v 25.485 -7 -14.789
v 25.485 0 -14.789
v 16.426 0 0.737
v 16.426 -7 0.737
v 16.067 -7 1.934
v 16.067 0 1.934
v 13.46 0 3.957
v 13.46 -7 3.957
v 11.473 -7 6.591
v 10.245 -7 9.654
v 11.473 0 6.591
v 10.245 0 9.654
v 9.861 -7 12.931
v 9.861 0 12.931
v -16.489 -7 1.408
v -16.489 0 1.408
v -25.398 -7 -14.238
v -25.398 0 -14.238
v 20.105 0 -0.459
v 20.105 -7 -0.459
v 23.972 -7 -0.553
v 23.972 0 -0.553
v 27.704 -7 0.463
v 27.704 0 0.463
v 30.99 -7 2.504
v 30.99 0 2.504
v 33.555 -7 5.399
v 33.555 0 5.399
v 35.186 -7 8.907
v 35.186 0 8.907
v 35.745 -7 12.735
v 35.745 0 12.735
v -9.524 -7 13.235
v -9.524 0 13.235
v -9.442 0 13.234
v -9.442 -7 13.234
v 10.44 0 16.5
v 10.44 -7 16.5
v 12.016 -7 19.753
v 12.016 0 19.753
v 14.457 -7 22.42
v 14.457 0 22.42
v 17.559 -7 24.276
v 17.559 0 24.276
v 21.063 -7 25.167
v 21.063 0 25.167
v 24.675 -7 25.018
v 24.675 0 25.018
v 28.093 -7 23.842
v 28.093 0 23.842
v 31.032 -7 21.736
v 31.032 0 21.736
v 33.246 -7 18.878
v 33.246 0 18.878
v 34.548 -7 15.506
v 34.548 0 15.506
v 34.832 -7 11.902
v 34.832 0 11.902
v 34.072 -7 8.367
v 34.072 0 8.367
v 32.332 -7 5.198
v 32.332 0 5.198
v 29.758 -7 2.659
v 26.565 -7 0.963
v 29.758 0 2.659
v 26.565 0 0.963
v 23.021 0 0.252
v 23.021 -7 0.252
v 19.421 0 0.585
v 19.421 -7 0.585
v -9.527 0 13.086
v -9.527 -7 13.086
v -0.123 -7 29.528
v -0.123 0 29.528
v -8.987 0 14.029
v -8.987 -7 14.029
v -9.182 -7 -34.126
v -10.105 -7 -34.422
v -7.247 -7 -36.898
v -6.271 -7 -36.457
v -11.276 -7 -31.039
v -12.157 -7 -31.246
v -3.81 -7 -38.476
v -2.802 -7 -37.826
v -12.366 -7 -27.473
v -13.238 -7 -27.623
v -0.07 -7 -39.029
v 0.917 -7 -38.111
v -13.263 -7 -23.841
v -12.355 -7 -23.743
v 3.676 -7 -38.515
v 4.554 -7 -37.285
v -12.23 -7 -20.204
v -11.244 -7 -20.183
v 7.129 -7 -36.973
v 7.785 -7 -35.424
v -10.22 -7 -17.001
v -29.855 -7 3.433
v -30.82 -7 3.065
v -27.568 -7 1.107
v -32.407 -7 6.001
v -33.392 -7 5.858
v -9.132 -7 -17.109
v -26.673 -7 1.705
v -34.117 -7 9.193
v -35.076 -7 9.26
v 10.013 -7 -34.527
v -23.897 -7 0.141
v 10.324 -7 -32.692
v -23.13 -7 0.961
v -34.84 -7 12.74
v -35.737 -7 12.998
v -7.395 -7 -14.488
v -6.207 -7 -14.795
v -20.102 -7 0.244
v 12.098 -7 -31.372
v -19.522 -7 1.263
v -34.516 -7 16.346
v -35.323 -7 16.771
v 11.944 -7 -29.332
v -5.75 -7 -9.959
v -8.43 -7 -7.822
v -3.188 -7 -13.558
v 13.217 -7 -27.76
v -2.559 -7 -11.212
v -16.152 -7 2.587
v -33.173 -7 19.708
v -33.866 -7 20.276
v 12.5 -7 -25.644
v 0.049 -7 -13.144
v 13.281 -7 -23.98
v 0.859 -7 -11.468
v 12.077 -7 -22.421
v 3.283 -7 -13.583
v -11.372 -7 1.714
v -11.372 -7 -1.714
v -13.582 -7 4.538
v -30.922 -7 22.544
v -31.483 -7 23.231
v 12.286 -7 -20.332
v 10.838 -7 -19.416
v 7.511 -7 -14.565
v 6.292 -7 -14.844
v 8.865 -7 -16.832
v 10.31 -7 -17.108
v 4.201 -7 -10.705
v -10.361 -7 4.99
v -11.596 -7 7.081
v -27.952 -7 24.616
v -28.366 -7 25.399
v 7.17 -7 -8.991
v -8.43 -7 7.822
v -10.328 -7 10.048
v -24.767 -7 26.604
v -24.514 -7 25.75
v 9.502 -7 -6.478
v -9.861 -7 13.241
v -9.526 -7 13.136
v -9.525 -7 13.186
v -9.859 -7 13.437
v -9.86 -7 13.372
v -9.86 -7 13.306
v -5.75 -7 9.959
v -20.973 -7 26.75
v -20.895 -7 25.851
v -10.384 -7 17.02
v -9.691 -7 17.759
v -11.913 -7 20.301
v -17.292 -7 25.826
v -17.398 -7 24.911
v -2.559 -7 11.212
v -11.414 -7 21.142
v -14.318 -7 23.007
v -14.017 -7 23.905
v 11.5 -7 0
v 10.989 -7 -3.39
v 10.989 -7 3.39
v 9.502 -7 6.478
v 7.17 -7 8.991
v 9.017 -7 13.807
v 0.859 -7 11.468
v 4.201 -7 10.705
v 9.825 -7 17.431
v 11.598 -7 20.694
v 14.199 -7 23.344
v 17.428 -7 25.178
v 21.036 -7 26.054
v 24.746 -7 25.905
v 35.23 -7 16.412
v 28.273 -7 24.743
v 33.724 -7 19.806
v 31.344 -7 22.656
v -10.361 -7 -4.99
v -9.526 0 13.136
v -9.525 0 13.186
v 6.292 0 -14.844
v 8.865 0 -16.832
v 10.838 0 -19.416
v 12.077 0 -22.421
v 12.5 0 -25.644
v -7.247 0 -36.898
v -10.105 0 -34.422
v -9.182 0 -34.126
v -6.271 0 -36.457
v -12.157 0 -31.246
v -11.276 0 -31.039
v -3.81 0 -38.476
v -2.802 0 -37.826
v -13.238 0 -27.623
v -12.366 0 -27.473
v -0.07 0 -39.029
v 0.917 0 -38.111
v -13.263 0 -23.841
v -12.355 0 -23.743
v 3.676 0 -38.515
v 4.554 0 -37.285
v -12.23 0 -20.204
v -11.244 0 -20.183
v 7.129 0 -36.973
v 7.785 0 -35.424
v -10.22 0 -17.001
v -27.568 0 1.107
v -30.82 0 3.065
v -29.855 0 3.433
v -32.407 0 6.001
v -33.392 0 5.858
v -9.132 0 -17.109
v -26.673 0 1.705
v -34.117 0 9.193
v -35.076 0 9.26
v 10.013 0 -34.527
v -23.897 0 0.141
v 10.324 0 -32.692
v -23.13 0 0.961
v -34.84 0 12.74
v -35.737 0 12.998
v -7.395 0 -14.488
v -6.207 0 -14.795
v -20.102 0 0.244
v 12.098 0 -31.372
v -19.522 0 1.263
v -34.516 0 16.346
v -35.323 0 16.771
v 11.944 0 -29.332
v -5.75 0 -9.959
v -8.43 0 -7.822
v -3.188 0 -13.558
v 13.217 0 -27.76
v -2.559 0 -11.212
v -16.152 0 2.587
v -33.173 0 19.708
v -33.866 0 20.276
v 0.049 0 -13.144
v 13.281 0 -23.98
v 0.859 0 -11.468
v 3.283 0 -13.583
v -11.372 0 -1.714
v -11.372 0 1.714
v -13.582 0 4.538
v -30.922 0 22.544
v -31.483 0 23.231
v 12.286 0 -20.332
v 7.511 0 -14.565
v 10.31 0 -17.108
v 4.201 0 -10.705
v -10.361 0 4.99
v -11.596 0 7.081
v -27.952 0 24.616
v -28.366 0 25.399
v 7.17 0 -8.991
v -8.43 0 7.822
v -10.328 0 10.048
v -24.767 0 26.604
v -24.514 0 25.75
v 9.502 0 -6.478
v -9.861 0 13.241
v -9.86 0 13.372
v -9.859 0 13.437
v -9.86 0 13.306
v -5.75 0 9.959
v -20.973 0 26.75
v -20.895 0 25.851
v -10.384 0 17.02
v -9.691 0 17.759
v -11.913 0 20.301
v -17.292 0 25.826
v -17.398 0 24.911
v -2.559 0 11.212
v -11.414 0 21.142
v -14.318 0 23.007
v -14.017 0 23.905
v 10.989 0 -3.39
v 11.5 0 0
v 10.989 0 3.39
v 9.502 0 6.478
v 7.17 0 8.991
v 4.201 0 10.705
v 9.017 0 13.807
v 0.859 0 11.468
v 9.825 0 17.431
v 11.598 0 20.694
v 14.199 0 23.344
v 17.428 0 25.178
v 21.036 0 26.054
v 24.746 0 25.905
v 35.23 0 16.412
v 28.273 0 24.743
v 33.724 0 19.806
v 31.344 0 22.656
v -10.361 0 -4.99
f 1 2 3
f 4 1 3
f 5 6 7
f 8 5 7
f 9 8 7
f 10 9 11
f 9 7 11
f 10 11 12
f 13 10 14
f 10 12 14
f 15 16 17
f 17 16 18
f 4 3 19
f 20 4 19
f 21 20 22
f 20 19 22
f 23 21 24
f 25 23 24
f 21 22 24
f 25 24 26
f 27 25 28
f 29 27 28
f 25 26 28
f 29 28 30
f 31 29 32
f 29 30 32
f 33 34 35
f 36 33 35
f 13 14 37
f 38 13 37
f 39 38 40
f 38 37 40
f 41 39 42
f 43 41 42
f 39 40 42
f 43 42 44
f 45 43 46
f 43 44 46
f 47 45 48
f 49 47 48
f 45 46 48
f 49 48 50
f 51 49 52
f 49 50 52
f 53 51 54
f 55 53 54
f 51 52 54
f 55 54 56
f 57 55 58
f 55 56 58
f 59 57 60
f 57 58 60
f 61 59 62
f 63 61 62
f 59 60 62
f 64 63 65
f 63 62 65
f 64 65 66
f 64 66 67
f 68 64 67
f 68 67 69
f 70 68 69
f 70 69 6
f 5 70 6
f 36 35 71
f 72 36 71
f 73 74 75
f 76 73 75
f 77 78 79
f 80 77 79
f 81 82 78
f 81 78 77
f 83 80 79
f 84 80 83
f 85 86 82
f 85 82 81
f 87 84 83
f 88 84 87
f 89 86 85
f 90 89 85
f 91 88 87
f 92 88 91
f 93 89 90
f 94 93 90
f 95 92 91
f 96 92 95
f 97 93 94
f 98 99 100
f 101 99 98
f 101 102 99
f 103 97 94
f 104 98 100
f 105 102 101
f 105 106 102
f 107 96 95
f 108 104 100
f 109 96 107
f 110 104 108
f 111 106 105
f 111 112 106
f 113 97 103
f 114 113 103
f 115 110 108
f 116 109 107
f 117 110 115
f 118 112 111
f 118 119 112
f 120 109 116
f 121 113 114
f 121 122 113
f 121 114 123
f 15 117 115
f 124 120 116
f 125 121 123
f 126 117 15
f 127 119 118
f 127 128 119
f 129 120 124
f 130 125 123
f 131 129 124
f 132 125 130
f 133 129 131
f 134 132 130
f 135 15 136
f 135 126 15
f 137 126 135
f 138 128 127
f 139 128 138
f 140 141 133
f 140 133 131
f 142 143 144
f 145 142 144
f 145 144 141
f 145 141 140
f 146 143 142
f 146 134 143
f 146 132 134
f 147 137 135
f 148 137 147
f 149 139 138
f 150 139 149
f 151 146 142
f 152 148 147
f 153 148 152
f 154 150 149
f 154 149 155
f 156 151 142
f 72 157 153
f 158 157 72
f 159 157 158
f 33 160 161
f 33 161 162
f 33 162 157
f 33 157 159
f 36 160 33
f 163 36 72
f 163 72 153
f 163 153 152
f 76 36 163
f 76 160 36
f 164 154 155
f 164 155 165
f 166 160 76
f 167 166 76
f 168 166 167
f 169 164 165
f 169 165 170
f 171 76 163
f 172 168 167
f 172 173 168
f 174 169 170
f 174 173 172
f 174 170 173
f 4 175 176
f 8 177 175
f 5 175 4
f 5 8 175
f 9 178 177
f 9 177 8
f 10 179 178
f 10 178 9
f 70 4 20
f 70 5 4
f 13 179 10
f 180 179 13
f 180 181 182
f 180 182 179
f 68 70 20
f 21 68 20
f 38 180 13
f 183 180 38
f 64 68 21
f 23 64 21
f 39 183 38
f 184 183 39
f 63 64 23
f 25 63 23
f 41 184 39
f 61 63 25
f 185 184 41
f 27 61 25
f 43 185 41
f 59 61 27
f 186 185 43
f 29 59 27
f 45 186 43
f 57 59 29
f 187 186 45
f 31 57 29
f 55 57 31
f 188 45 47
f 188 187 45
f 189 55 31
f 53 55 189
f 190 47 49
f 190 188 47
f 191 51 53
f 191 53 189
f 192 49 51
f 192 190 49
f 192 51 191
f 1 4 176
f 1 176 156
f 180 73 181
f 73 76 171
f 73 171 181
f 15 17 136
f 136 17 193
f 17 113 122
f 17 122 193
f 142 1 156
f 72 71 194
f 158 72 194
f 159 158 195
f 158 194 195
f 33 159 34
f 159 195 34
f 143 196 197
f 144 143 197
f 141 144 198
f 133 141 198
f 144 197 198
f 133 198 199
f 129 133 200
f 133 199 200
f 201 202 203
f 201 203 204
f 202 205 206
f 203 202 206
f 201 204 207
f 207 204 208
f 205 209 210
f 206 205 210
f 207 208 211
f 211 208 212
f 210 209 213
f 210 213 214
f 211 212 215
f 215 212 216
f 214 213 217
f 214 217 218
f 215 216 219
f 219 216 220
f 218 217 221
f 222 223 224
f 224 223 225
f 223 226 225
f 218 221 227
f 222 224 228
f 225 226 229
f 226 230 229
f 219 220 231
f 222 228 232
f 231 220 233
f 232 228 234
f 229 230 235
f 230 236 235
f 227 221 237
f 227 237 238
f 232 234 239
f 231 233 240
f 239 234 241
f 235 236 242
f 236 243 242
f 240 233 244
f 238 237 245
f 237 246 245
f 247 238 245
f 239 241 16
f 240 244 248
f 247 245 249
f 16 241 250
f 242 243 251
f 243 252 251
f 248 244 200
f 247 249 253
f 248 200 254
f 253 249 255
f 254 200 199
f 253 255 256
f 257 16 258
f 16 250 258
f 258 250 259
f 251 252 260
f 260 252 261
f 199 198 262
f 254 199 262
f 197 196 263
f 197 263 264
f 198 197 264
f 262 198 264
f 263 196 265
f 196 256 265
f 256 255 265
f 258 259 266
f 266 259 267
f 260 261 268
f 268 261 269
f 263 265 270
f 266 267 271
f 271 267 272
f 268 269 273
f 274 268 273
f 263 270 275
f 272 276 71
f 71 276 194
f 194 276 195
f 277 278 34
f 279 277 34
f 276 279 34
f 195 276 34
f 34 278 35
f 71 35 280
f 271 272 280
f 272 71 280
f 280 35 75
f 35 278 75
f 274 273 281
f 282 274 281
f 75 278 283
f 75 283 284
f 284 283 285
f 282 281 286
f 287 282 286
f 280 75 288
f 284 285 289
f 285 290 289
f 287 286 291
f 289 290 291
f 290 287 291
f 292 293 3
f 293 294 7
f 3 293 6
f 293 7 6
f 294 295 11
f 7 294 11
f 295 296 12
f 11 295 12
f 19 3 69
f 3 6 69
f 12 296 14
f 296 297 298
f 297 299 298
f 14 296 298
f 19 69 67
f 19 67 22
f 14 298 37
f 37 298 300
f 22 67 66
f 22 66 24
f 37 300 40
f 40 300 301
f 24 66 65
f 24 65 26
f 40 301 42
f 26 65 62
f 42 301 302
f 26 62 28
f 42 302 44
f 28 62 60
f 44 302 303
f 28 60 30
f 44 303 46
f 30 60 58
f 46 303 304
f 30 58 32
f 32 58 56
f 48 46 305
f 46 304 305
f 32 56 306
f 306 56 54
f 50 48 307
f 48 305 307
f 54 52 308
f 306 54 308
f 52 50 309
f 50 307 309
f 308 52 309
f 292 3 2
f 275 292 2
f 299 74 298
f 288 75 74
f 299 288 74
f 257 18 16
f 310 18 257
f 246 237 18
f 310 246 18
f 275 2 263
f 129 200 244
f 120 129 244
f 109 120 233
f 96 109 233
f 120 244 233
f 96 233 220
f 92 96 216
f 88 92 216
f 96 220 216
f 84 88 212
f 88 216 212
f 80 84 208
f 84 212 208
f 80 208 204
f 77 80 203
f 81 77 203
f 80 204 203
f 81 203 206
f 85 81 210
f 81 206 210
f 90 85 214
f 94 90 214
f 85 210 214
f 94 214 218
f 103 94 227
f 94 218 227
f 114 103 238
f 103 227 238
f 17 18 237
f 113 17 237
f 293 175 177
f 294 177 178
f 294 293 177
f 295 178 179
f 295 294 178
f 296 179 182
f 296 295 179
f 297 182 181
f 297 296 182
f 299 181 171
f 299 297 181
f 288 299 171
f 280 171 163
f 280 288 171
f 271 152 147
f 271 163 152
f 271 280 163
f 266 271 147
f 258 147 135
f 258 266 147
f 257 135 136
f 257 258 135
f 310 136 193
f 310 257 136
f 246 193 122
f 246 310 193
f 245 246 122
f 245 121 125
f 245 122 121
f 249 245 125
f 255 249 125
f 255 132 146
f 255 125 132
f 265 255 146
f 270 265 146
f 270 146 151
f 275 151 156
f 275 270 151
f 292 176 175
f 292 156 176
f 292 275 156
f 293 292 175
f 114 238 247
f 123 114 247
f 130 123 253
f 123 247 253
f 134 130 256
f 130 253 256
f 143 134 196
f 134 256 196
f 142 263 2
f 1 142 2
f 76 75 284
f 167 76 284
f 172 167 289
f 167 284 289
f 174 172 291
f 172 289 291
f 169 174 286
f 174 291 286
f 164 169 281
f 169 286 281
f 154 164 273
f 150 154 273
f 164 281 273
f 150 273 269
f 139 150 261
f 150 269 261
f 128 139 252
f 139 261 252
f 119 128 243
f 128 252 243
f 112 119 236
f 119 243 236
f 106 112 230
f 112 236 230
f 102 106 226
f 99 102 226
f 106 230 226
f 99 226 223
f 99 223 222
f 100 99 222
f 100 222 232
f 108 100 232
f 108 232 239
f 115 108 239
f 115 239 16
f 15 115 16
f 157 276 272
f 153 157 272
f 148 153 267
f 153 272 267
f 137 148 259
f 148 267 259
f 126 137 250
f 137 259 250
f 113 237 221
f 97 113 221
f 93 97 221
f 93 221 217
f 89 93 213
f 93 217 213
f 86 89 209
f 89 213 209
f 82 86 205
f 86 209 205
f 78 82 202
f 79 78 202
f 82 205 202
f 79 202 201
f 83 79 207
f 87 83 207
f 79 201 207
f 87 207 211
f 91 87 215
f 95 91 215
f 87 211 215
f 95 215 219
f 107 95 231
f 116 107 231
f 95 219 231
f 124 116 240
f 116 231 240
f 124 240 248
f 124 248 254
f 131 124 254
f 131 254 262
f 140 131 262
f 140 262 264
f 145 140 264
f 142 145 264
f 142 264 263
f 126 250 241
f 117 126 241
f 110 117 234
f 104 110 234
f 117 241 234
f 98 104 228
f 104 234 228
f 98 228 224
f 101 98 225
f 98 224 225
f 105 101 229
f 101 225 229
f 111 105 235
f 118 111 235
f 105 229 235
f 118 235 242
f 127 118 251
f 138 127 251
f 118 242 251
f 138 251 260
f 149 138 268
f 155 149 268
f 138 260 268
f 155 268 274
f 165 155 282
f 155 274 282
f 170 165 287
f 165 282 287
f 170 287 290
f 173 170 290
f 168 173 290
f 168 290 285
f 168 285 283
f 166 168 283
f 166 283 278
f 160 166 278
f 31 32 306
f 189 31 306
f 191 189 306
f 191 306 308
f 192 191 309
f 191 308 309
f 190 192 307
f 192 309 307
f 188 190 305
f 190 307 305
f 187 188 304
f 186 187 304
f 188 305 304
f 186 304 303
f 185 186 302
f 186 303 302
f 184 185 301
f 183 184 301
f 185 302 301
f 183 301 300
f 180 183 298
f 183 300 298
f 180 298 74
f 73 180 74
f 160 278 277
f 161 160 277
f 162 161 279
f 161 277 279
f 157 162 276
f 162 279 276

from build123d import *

# Parameters (mm, degrees)
F2_DEPTH = 7
F0_R     = 11.5
F3_DEPTH = 26.416


with BuildPart() as f2:
    # F1 (on Front) → F2 (new body)
    with BuildSketch(Plane.XZ):
        with BuildLine():
            ThreePointArc((-9.8594943471, 13.4371291696), (-9.8598798703, 13.3389562022), (-9.8610364161, 13.2407892906))
            Line((-9.8610364161, 13.2407892906), (-9.5237098666, 13.2354901845))
            Line((-9.5237098666, 13.2354901845), (-9.4420993874, 13.234208155))
            Line((-9.4420993874, 13.234208155), (-8.9874716534, 14.0291067183))
            ThreePointArc((-8.9874716534, 14.0291067183), (-33.8655402549, 20.2761595034), (-16.4893494105, 1.4078803666))
            Line((-16.4893494105, 1.4078803666), (-15.9845189072, 2.2945213217))
            Line((-15.9845189072, 2.2945213217), (-16.1520543214, 2.5873509079))
            ThreePointArc((-16.1520543214, 2.5873509079), (-33.1725189083, 19.7083730525), (-9.8594943471, 13.4371291696))
        make_face()
        with BuildLine():
            Line((-15.7125081445, 1.8190827434), (-15.9845189072, 2.2945213217))
            Line((-15.9845189072, 2.2945213217), (-16.4893494105, 1.4078803666))
            ThreePointArc((-16.4893494105, 1.4078803666), (-16.0975525686, 1.6071032397), (-15.7125081445, 1.8190827434))
        make_face()
        with BuildLine():
            Line((-8.9874716534, 14.0291067183), (-9.4420993874, 13.234208155))
            Line((-9.4420993874, 13.234208155), (-8.9760259484, 13.2268865476))
            ThreePointArc((-8.9760259484, 13.2268865476), (-8.974787508, 13.3320046163), (-8.9743746861, 13.4371291696))
            ThreePointArc((-8.9743746861, 13.4371291696), (-8.9776493285, 13.7331903747), (-8.9874716534, 14.0291067183))
        make_face()
        with BuildLine():
            Line((-6.6469862026, -14.026241978), (-15.7125081445, 1.8190827434))
            ThreePointArc((-15.7125081445, 1.8190827434), (-16.0975525686, 1.6071032397), (-16.4893494105, 1.4078803666))
            Line((-16.4893494105, 1.4078803666), (-25.3977489889, -14.2380678461))
            Line((-25.3977489889, -14.2380678461), (-7.3951647118, -14.4875430354))
            ThreePointArc((-7.3951647118, -14.4875430354), (-7.0248630052, -14.2507495292), (-6.6469862026, -14.026241978))
        make_face()
        with BuildLine():
            ThreePointArc((-8.9743746861, 13.4371291696), (-8.974787508, 13.3320046163), (-8.9760259484, 13.2268865476))
            Line((-8.9760259484, 13.2268865476), (8.9760259484, 12.9448754613))
            ThreePointArc((8.9760259484, 12.9448754613), (8.989763273, 13.3762864413), (9.0174033464, 13.8070301865))
            Line((9.0174033464, 13.8070301865), (-0.1233932709, 29.5275962356))
            Line((-0.1233932709, 29.5275962356), (-8.9874716534, 14.0291067183))
            ThreePointArc((-8.9874716534, 14.0291067183), (-8.9776493285, 13.7331903747), (-8.9743746861, 13.4371291696))
        make_face()
        with BuildLine():
            Line((-6.3749754398, -14.5016805563), (-6.6469862026, -14.026241978))
            ThreePointArc((-6.6469862026, -14.026241978), (-7.0248630052, -14.2507495292), (-7.3951647118, -14.4875430354))
            Line((-7.3951647118, -14.4875430354), (-6.3749754398, -14.5016805563))
        make_face()
        with BuildLine():
            ThreePointArc((9.0174033464, 13.8070301865), (8.989763273, 13.3762864413), (8.9760259484, 12.9448754613))
            Line((8.9760259484, 12.9448754613), (9.5237098666, 12.9362718244))
            Line((9.5237098666, 12.9362718244), (9.0174033464, 13.8070301865))
        make_face()
        with BuildLine():
            Line((-6.2074400257, -14.7945101426), (-6.3749754398, -14.5016805563))
            Line((-6.3749754398, -14.5016805563), (-7.3951647118, -14.4875430354))
            ThreePointArc((-7.3951647118, -14.4875430354), (-6.3315189236, -37.4372225794), (13.385119661, -25.6442884042))
            ThreePointArc((13.385119661, -25.6442884042), (11.825746284, -19.3742682156), (7.5109617661, -14.5651692295))
            Line((7.5109617661, -14.5651692295), (6.4622937408, -14.5520938009))
            Line((6.4622937408, -14.5520938009), (6.2924635872, -14.8435985187))
            ThreePointArc((6.2924635872, -14.8435985187), (10.8375687965, -19.415556384), (12.5, -25.6442884042))
            ThreePointArc((12.5, -25.6442884042), (-6.2712438829, -36.4573129654), (-6.2074400257, -14.7945101426))
        make_face()
        with BuildLine():
            ThreePointArc((7.5109617661, -14.5651692295), (7.1286450726, -14.3153940288), (6.7380302462, -14.0788062811))
            Line((6.7380302462, -14.0788062811), (6.4622937408, -14.5520938009))
            Line((6.4622937408, -14.5520938009), (7.5109617661, -14.5651692295))
        make_face()
        with BuildLine():
            Line((15.6214641009, 1.1691507162), (6.7380302462, -14.0788062811))
            ThreePointArc((6.7380302462, -14.0788062811), (7.1286450726, -14.3153940288), (7.5109617661, -14.5651692295))
            Line((7.5109617661, -14.5651692295), (25.4854150726, -14.7892856087))
            Line((25.4854150726, -14.7892856087), (16.4257602341, 0.7366235122))
            ThreePointArc((16.4257602341, 0.7366235122), (16.0199223632, 0.9460258224), (15.6214641009, 1.1691507162))
        make_face()
        with BuildLine():
            Line((9.0174033464, 13.8070301865), (9.5237098666, 12.9362718244))
            Line((9.5237098666, 12.9362718244), (9.8610364161, 12.9309727184))
            ThreePointArc((9.8610364161, 12.9309727184), (22.4576673144, 25.2342473162), (34.8594943471, 12.7346328394))
            ThreePointArc((34.8594943471, 12.7346328394), (28.5882263673, 1.8970640428), (16.0670307599, 1.9339429538))
            Line((16.0670307599, 1.9339429538), (15.8972006063, 1.642438236))
            Line((15.8972006063, 1.642438236), (16.4257602341, 0.7366235122))
            ThreePointArc((16.4257602341, 0.7366235122), (29.4212819112, 1.363943118), (35.7446140081, 12.7346328394))
            ThreePointArc((35.7446140081, 12.7346328394), (22.8961244654, 26.1089910092), (9.0174033464, 13.8070301865))
        make_face()
        with BuildLine():
            Line((15.8972006063, 1.642438236), (15.6214641009, 1.1691507162))
            ThreePointArc((15.6214641009, 1.1691507162), (16.0199223632, 0.9460258224), (16.4257602341, 0.7366235122))
            Line((16.4257602341, 0.7366235122), (15.8972006063, 1.642438236))
        make_face()
        with BuildLine():
            Line((-9.5237098666, 13.2354901845), (-9.8610364161, 13.2407892906))
            ThreePointArc((-9.8610364161, 13.2407892906), (-11.5960566093, 7.0811549669), (-16.1520543214, 2.5873509079))
            Line((-16.1520543214, 2.5873509079), (-15.9845189072, 2.2945213217))
            Line((-15.9845189072, 2.2945213217), (-15.7125081445, 1.8190827434))
            ThreePointArc((-15.7125081445, 1.8190827434), (-10.8339021804, 6.6310911483), (-8.9760259484, 13.2268865476))
            Line((-8.9760259484, 13.2268865476), (-9.4420993874, 13.234208155))
            Line((-9.4420993874, 13.234208155), (-9.5269323957, 13.0858810045))
            ThreePointArc((-9.5269323957, 13.0858810045), (-9.5251031319, 13.1606808989), (-9.5237098666, 13.2354901845))
        make_face()
        with BuildLine():
            ThreePointArc((6.7380302462, -14.0788062811), (0.0525643031, -12.2592719555), (-6.6469862026, -14.026241978))
            Line((-6.6469862026, -14.026241978), (-6.3749754398, -14.5016805563))
            Line((-6.3749754398, -14.5016805563), (-6.2074400257, -14.7945101426))
            ThreePointArc((-6.2074400257, -14.7945101426), (0.0490883761, -13.1443847914), (6.2924635872, -14.8435985187))
            Line((6.2924635872, -14.8435985187), (6.4622937408, -14.5520938009))
            Line((6.4622937408, -14.5520938009), (6.7380302462, -14.0788062811))
        make_face()
        with BuildLine():
            ThreePointArc((-8.9760259484, 13.2268865476), (-10.8339021804, 6.6310911483), (-15.7125081445, 1.8190827434))
            Line((-15.7125081445, 1.8190827434), (-6.6469862026, -14.026241978))
            ThreePointArc((-6.6469862026, -14.026241978), (0.0525643031, -12.2592719555), (6.7380302462, -14.0788062811))
            Line((6.7380302462, -14.0788062811), (15.6214641009, 1.1691507162))
            ThreePointArc((15.6214641009, 1.1691507162), (10.7024964382, 6.15619624), (8.9760259484, 12.9448754613))
            Line((8.9760259484, 12.9448754613), (-8.9760259484, 13.2268865476))
        make_face()
        with BuildLine():
            Line((9.5237098666, 12.9362718244), (8.9760259484, 12.9448754613))
            ThreePointArc((8.9760259484, 12.9448754613), (10.7024964382, 6.15619624), (15.6214641009, 1.1691507162))
            Line((15.6214641009, 1.1691507162), (15.8972006063, 1.642438236))
            Line((15.8972006063, 1.642438236), (16.0670307599, 1.9339429538))
            ThreePointArc((16.0670307599, 1.9339429538), (11.4733403529, 6.5912094278), (9.8610364161, 12.9309727184))
            Line((9.8610364161, 12.9309727184), (9.5237098666, 12.9362718244))
        make_face()
    extrude(amount=F2_DEPTH)

    # F0 (on Front) → F3 (cut)
    with BuildSketch(Plane.XZ):
        Circle(F0_R)
    extrude(amount=F3_DEPTH, mode=Mode.SUBTRACT)


solid = f2.part
